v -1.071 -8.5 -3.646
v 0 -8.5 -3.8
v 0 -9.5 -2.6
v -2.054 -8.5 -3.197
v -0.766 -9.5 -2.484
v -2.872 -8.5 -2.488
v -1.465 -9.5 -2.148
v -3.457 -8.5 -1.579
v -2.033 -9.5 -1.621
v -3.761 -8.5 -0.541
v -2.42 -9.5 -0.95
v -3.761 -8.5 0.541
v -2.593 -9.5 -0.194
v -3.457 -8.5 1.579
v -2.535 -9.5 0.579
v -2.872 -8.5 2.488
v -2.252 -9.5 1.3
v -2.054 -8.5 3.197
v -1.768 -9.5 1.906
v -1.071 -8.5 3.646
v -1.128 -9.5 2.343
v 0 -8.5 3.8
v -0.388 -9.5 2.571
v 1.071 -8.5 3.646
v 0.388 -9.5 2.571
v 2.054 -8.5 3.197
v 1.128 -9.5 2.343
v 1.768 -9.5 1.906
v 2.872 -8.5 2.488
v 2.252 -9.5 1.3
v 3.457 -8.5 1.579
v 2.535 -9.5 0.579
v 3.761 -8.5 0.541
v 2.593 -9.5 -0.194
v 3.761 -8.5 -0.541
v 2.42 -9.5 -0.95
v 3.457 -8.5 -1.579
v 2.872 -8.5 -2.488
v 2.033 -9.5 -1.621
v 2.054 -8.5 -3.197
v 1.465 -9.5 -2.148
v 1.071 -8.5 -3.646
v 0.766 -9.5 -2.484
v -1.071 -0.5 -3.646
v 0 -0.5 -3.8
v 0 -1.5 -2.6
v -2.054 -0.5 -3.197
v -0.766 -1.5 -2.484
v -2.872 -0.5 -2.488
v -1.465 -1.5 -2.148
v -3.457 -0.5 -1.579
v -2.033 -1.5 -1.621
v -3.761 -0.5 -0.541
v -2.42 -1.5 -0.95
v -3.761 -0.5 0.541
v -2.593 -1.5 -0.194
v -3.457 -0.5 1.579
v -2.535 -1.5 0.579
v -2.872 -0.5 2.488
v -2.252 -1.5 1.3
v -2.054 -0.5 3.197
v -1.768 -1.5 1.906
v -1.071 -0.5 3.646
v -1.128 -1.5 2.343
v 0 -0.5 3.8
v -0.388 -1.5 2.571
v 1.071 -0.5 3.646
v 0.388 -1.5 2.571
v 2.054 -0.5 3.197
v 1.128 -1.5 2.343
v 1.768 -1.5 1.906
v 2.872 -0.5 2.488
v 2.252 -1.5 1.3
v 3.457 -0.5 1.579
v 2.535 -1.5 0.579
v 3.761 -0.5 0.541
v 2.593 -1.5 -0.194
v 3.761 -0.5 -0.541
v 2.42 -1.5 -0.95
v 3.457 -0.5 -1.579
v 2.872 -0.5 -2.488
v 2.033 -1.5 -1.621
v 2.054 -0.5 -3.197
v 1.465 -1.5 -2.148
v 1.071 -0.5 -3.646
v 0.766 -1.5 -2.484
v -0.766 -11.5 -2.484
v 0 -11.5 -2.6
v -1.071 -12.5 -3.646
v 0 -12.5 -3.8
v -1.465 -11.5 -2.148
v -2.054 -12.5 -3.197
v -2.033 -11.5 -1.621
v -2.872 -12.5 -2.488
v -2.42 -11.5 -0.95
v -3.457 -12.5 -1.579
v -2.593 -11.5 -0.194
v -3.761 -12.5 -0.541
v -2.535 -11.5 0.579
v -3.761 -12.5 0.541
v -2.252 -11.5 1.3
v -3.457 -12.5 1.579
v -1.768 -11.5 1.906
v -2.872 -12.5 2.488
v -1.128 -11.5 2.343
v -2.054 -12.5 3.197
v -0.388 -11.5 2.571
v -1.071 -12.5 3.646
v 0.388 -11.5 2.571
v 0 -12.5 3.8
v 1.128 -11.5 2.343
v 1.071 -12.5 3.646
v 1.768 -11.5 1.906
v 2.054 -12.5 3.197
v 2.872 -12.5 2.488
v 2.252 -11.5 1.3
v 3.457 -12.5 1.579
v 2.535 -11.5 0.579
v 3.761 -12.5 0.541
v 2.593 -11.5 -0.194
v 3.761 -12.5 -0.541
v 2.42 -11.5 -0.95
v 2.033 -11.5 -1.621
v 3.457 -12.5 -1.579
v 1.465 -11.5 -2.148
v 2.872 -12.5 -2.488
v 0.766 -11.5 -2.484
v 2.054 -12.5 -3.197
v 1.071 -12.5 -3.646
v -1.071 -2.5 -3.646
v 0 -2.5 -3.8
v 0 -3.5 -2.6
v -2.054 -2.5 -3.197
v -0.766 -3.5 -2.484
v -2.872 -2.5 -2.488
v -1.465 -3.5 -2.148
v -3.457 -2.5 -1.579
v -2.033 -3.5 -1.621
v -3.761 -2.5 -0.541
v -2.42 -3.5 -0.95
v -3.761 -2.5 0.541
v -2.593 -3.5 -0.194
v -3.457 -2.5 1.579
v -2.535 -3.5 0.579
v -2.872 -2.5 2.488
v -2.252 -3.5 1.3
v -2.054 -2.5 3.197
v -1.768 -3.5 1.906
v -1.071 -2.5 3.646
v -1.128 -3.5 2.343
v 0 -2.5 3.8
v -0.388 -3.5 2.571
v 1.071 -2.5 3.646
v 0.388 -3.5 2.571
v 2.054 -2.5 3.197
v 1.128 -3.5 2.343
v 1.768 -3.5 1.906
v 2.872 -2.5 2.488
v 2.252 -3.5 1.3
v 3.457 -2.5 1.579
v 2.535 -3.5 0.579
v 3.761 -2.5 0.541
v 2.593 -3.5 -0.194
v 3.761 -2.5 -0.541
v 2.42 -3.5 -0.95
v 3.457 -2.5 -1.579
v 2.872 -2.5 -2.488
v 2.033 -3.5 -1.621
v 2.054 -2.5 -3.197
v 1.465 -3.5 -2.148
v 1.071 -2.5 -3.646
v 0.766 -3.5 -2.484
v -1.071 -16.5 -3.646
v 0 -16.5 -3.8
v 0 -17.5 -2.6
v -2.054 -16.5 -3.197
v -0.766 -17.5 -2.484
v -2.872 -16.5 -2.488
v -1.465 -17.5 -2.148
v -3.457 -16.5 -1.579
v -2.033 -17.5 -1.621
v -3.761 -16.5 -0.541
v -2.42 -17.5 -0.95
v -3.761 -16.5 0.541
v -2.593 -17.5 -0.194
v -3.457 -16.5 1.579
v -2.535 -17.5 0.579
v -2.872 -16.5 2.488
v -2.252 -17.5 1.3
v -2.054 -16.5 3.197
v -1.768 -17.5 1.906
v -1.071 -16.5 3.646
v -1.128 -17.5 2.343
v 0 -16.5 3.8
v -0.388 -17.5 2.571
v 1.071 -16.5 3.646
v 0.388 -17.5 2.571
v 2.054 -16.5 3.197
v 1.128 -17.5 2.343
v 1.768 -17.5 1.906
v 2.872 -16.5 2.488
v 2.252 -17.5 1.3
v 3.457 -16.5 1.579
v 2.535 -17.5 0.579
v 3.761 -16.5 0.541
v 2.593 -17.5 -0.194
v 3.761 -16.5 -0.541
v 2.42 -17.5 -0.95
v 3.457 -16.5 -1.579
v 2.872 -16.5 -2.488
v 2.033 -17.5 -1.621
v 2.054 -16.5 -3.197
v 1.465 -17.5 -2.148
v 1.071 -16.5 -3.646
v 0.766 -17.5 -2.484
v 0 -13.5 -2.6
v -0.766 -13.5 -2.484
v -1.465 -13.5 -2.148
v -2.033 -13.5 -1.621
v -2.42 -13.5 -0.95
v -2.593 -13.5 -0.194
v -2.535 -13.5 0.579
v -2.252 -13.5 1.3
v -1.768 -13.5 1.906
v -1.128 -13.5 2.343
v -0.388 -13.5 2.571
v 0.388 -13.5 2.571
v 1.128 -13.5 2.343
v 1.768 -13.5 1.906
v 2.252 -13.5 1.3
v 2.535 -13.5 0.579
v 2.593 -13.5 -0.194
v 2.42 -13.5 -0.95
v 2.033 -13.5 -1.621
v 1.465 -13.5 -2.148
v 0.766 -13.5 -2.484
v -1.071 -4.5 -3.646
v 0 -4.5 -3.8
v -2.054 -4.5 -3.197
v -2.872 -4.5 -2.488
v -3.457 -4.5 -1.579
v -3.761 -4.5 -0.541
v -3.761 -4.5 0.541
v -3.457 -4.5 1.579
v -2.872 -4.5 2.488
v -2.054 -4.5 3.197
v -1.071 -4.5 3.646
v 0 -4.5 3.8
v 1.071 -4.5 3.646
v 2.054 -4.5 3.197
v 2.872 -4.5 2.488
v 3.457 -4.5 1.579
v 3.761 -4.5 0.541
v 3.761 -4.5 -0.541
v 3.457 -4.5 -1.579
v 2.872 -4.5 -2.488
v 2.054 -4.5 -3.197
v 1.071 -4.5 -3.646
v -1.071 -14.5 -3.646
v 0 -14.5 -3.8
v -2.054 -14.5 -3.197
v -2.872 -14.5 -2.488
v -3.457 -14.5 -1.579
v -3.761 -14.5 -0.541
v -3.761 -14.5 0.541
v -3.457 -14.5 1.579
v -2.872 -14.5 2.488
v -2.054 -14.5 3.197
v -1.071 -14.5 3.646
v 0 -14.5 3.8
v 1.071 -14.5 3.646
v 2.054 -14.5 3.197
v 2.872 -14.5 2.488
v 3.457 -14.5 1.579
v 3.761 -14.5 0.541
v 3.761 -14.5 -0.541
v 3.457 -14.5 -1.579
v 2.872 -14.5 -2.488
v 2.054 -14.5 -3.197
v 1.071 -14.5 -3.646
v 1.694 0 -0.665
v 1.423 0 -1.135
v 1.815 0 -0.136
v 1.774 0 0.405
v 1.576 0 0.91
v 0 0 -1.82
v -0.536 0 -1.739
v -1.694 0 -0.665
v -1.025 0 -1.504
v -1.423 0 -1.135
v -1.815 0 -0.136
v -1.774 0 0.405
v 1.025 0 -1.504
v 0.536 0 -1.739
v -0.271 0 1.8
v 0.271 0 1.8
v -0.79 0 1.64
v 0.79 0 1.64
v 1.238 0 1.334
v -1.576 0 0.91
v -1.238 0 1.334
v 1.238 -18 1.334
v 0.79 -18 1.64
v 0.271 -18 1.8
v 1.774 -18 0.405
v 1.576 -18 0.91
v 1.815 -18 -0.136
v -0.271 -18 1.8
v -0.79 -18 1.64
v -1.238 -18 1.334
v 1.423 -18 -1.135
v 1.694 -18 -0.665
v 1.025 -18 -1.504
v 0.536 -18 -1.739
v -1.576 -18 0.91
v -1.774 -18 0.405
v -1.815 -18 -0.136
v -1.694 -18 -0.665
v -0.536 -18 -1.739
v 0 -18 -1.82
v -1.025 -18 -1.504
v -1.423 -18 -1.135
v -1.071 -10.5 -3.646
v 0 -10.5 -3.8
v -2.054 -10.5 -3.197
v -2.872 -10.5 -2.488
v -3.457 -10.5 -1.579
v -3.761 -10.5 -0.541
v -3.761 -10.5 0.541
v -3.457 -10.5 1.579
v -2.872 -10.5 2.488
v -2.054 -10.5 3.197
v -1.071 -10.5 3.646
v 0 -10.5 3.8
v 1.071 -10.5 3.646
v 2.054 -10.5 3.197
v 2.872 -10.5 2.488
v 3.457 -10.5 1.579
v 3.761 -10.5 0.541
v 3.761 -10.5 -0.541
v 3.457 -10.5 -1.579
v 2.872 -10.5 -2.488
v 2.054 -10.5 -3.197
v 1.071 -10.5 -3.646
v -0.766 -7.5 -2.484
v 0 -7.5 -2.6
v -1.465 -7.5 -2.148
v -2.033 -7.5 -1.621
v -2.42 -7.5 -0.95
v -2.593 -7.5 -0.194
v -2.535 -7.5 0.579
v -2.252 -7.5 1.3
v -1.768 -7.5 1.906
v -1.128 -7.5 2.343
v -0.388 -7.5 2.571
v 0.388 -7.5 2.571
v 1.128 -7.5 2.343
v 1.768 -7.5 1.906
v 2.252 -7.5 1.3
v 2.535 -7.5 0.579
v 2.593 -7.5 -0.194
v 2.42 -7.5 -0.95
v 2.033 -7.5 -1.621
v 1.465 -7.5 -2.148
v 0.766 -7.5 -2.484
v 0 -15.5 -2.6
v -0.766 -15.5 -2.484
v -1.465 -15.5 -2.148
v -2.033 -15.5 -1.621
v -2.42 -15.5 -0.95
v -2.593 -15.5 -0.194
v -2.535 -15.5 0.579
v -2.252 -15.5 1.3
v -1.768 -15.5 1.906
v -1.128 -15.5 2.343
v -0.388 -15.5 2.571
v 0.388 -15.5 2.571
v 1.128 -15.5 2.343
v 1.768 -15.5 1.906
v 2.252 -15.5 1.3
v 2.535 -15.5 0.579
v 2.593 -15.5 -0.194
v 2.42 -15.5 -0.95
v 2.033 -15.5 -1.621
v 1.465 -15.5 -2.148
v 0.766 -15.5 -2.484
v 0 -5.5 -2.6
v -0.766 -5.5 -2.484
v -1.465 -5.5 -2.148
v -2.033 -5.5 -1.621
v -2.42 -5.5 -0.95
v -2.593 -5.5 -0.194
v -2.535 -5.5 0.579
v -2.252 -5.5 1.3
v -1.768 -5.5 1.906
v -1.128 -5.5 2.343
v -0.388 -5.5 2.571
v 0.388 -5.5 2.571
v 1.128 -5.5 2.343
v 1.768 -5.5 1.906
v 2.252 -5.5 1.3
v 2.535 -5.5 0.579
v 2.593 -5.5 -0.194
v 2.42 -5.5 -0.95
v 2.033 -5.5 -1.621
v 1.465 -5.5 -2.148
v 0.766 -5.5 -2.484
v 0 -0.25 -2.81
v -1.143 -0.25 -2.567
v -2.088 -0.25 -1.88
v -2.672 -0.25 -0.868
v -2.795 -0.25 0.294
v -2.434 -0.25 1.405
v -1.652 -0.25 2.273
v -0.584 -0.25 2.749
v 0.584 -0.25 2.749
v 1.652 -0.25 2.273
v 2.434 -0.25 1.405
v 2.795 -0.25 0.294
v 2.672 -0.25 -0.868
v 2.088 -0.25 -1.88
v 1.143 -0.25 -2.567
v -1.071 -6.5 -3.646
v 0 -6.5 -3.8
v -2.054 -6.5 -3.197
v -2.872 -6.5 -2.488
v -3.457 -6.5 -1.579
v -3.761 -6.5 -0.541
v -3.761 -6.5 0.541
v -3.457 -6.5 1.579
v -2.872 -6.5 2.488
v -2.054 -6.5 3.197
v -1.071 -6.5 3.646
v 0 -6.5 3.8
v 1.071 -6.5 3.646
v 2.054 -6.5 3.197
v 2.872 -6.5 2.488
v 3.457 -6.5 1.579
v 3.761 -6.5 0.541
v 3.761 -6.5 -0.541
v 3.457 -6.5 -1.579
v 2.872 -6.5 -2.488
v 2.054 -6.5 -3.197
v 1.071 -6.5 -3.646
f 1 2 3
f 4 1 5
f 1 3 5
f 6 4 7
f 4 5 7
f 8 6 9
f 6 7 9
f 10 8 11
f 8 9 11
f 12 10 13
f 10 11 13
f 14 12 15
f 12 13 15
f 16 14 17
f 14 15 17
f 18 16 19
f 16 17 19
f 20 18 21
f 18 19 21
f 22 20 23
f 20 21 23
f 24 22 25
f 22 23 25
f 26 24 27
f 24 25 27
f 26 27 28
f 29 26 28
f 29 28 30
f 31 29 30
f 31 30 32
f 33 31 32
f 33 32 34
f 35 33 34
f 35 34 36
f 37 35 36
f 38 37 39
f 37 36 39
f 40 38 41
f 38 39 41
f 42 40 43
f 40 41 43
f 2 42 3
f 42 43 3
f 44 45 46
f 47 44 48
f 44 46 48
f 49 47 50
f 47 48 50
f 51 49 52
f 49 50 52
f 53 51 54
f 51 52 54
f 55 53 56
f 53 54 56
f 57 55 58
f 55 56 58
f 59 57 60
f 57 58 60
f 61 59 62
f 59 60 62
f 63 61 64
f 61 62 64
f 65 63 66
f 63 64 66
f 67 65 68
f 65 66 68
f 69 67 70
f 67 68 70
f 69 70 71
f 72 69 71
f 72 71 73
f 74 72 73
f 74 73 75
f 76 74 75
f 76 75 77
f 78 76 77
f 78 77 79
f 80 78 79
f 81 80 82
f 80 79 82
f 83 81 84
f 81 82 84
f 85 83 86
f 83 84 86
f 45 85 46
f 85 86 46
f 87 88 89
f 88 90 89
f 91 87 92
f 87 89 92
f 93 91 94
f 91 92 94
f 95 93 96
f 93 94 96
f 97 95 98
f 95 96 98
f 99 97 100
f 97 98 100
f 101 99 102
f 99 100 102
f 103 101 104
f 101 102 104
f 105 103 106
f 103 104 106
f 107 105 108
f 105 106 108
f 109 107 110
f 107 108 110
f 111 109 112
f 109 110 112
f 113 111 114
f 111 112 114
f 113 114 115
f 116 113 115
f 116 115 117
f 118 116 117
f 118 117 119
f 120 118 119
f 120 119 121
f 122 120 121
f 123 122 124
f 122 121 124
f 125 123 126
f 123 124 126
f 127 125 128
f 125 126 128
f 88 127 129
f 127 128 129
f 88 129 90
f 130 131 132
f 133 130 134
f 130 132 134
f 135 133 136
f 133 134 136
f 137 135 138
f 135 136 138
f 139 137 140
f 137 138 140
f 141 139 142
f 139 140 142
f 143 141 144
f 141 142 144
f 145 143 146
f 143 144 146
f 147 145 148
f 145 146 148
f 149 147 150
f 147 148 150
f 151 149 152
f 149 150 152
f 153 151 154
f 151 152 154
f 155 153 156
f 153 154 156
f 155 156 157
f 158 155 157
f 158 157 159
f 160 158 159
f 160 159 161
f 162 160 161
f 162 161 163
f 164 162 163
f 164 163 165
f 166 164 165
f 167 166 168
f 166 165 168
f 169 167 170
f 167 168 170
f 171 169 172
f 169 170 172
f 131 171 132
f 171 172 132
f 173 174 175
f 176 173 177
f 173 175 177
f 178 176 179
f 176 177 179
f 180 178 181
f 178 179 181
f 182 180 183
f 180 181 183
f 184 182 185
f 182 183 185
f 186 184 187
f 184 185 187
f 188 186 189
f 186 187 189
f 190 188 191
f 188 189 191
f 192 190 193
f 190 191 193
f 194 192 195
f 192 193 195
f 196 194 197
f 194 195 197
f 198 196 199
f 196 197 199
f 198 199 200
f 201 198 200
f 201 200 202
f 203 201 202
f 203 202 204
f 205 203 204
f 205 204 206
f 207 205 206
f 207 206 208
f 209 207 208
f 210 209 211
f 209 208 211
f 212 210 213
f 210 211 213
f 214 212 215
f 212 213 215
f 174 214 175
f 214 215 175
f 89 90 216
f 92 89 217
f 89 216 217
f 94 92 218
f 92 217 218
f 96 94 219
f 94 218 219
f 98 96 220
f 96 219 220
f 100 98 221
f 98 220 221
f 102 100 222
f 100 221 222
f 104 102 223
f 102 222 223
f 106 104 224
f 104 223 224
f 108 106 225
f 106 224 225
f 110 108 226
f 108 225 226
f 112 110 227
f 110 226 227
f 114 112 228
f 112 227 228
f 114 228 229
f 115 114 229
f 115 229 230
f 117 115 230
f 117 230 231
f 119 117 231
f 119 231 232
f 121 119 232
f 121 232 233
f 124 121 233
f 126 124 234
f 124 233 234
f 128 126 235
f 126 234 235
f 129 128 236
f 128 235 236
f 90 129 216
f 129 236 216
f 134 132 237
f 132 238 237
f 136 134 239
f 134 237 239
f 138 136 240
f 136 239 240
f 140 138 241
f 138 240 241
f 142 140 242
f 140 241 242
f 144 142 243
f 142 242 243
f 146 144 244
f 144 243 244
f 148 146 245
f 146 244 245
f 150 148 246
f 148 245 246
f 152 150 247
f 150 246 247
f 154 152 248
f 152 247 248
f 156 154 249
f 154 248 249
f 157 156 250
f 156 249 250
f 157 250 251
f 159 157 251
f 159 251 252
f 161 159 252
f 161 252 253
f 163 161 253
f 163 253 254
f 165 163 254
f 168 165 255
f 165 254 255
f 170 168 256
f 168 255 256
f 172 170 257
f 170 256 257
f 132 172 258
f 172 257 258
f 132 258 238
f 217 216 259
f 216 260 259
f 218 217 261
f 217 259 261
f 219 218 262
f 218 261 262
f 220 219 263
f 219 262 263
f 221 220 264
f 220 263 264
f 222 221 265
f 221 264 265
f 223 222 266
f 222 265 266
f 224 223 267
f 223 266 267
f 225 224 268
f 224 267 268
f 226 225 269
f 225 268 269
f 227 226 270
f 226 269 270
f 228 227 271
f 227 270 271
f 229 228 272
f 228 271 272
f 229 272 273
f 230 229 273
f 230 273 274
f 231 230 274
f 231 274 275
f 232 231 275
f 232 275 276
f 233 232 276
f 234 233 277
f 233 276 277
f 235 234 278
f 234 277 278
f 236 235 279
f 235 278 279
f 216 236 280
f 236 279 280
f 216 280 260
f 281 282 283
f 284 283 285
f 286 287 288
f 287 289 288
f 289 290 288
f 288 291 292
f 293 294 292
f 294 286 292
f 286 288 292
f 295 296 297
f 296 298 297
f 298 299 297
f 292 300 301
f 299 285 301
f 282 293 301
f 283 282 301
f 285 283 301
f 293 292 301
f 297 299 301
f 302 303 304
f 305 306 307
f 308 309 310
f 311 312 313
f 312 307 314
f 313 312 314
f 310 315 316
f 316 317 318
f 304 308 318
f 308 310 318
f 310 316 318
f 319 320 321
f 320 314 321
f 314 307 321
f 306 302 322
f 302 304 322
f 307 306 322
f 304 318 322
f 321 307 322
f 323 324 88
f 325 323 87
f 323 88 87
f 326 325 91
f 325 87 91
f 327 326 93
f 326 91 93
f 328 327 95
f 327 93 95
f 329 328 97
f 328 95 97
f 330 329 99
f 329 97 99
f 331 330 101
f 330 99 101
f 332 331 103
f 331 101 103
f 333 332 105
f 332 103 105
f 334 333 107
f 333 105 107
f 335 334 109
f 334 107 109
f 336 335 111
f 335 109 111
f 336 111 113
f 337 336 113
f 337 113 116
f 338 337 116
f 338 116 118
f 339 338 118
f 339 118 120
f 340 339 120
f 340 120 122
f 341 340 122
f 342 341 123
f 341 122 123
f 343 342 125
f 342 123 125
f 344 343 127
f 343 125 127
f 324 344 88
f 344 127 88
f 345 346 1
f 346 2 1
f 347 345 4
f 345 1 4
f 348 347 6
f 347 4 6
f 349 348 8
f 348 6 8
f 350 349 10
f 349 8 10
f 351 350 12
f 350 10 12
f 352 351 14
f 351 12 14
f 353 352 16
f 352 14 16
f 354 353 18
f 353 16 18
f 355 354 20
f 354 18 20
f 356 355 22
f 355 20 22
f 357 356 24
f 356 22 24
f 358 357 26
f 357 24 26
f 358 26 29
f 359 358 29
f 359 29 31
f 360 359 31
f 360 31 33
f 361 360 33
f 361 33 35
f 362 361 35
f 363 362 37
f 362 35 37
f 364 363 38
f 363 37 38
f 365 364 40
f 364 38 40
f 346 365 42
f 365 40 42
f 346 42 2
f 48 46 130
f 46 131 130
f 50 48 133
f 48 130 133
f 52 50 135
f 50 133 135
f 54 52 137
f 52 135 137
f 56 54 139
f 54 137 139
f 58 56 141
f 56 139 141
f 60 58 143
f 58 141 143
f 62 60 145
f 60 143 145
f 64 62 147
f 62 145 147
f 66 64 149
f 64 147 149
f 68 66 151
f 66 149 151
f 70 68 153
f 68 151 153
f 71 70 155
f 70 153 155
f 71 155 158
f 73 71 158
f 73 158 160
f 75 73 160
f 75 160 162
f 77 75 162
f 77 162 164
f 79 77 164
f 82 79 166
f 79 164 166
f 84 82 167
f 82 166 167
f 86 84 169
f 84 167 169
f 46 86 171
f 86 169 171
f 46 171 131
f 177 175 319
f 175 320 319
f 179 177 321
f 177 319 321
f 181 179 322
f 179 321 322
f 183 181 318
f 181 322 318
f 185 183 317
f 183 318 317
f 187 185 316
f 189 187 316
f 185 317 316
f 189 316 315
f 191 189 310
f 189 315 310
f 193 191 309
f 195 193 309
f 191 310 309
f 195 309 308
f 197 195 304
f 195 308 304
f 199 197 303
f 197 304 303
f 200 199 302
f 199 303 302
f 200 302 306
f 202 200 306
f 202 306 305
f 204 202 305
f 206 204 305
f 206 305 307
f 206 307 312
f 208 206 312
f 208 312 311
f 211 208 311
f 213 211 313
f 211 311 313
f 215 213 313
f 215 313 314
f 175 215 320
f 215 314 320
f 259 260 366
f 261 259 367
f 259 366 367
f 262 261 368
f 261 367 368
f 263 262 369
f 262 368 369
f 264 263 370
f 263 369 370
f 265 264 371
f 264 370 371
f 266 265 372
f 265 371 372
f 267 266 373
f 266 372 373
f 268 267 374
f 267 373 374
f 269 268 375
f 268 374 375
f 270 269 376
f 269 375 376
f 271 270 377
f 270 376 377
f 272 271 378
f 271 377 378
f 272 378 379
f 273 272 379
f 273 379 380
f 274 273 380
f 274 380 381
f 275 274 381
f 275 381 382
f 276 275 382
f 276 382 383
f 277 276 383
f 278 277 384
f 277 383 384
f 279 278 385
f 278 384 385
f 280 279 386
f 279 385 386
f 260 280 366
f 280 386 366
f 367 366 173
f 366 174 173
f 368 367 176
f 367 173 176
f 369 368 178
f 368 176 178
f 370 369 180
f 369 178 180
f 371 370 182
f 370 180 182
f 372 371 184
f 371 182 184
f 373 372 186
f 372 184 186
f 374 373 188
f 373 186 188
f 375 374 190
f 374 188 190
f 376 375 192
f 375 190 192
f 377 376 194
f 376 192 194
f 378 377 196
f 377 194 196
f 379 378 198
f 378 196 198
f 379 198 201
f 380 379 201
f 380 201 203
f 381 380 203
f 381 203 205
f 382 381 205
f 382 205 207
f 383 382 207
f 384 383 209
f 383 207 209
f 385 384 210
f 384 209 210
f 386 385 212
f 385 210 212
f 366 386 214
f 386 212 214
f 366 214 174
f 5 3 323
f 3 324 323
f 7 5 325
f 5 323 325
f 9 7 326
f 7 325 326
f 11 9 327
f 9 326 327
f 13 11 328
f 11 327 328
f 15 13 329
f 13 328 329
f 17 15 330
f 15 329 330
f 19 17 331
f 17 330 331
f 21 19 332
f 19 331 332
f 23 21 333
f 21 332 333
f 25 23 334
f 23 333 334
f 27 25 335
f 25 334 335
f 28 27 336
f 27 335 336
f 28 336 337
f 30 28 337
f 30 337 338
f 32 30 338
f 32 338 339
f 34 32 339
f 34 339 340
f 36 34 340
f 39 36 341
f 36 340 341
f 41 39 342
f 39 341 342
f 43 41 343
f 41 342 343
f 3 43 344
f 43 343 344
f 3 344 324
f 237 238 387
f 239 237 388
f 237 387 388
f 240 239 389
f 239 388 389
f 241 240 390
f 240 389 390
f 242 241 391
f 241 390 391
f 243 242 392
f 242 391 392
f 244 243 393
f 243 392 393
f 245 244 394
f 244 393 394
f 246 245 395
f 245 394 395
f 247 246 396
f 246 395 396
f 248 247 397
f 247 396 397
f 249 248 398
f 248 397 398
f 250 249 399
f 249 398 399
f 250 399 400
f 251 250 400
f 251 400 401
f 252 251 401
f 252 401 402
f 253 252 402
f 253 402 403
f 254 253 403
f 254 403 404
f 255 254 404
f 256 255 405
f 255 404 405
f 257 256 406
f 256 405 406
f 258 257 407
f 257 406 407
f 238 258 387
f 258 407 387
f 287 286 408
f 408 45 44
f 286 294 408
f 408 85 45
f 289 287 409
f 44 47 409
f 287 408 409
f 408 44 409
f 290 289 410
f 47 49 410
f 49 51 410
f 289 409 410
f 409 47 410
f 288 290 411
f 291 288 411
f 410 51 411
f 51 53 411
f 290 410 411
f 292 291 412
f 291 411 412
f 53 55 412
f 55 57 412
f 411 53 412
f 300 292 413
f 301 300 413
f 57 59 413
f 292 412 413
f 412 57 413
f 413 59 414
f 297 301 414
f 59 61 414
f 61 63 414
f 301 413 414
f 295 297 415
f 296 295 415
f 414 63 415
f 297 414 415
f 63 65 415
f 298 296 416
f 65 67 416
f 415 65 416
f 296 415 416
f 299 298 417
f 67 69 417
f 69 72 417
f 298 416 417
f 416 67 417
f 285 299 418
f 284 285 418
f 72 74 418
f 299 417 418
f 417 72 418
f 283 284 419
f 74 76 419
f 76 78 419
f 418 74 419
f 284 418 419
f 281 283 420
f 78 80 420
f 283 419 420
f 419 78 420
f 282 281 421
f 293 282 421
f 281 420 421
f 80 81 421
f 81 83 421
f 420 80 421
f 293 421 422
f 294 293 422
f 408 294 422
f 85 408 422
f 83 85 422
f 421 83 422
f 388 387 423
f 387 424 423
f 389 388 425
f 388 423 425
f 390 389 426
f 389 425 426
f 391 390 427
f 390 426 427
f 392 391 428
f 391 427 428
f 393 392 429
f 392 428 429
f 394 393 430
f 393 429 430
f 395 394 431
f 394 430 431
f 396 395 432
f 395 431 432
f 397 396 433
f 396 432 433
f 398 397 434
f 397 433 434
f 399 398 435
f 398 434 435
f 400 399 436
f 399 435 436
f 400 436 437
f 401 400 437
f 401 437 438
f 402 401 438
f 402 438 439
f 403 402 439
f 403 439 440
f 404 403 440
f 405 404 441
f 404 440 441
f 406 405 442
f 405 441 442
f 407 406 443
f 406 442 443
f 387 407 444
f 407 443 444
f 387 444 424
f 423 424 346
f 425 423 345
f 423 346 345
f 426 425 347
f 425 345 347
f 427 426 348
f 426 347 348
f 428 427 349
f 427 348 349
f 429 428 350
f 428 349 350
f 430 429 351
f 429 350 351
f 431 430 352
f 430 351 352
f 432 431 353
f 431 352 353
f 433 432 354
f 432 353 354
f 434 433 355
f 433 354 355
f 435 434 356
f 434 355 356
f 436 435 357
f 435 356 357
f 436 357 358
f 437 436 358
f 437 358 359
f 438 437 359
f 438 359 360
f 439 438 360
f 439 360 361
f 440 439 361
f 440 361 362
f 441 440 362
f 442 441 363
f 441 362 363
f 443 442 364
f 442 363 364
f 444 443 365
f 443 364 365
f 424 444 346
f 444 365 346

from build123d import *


with BuildPart() as part:
    # Sketch1 → Elemento_elastico_en_serie (revolve)
    with BuildSketch(Plane.XY, mode=Mode.PRIVATE) as elemento_elastico_en_serie_sk:
        Polygon((0, 0), (1.82, 0), (3.8, -0.5), (2.6, -1.5), (3.8, -2.5), (2.6, -3.5), (3.8, -4.5), (2.6, -5.5), (3.8, -6.5), (2.6, -7.5), (3.8, -8.5), (2.6, -9.5), (3.8, -10.5), (2.6, -11.5), (3.8, -12.5), (2.6, -13.5), (3.8, -14.5), (2.6, -15.5), (3.8, -16.5), (2.6, -17.5), (1.82, -18), (0, -18), align=None)
    revolve(elemento_elastico_en_serie_sk.sketch.rotate(Axis((0, -22, 0), (0, 1, 0)), 90), axis=Axis((0, -22, 0), (0, 1, 0)))


solid = part.part
